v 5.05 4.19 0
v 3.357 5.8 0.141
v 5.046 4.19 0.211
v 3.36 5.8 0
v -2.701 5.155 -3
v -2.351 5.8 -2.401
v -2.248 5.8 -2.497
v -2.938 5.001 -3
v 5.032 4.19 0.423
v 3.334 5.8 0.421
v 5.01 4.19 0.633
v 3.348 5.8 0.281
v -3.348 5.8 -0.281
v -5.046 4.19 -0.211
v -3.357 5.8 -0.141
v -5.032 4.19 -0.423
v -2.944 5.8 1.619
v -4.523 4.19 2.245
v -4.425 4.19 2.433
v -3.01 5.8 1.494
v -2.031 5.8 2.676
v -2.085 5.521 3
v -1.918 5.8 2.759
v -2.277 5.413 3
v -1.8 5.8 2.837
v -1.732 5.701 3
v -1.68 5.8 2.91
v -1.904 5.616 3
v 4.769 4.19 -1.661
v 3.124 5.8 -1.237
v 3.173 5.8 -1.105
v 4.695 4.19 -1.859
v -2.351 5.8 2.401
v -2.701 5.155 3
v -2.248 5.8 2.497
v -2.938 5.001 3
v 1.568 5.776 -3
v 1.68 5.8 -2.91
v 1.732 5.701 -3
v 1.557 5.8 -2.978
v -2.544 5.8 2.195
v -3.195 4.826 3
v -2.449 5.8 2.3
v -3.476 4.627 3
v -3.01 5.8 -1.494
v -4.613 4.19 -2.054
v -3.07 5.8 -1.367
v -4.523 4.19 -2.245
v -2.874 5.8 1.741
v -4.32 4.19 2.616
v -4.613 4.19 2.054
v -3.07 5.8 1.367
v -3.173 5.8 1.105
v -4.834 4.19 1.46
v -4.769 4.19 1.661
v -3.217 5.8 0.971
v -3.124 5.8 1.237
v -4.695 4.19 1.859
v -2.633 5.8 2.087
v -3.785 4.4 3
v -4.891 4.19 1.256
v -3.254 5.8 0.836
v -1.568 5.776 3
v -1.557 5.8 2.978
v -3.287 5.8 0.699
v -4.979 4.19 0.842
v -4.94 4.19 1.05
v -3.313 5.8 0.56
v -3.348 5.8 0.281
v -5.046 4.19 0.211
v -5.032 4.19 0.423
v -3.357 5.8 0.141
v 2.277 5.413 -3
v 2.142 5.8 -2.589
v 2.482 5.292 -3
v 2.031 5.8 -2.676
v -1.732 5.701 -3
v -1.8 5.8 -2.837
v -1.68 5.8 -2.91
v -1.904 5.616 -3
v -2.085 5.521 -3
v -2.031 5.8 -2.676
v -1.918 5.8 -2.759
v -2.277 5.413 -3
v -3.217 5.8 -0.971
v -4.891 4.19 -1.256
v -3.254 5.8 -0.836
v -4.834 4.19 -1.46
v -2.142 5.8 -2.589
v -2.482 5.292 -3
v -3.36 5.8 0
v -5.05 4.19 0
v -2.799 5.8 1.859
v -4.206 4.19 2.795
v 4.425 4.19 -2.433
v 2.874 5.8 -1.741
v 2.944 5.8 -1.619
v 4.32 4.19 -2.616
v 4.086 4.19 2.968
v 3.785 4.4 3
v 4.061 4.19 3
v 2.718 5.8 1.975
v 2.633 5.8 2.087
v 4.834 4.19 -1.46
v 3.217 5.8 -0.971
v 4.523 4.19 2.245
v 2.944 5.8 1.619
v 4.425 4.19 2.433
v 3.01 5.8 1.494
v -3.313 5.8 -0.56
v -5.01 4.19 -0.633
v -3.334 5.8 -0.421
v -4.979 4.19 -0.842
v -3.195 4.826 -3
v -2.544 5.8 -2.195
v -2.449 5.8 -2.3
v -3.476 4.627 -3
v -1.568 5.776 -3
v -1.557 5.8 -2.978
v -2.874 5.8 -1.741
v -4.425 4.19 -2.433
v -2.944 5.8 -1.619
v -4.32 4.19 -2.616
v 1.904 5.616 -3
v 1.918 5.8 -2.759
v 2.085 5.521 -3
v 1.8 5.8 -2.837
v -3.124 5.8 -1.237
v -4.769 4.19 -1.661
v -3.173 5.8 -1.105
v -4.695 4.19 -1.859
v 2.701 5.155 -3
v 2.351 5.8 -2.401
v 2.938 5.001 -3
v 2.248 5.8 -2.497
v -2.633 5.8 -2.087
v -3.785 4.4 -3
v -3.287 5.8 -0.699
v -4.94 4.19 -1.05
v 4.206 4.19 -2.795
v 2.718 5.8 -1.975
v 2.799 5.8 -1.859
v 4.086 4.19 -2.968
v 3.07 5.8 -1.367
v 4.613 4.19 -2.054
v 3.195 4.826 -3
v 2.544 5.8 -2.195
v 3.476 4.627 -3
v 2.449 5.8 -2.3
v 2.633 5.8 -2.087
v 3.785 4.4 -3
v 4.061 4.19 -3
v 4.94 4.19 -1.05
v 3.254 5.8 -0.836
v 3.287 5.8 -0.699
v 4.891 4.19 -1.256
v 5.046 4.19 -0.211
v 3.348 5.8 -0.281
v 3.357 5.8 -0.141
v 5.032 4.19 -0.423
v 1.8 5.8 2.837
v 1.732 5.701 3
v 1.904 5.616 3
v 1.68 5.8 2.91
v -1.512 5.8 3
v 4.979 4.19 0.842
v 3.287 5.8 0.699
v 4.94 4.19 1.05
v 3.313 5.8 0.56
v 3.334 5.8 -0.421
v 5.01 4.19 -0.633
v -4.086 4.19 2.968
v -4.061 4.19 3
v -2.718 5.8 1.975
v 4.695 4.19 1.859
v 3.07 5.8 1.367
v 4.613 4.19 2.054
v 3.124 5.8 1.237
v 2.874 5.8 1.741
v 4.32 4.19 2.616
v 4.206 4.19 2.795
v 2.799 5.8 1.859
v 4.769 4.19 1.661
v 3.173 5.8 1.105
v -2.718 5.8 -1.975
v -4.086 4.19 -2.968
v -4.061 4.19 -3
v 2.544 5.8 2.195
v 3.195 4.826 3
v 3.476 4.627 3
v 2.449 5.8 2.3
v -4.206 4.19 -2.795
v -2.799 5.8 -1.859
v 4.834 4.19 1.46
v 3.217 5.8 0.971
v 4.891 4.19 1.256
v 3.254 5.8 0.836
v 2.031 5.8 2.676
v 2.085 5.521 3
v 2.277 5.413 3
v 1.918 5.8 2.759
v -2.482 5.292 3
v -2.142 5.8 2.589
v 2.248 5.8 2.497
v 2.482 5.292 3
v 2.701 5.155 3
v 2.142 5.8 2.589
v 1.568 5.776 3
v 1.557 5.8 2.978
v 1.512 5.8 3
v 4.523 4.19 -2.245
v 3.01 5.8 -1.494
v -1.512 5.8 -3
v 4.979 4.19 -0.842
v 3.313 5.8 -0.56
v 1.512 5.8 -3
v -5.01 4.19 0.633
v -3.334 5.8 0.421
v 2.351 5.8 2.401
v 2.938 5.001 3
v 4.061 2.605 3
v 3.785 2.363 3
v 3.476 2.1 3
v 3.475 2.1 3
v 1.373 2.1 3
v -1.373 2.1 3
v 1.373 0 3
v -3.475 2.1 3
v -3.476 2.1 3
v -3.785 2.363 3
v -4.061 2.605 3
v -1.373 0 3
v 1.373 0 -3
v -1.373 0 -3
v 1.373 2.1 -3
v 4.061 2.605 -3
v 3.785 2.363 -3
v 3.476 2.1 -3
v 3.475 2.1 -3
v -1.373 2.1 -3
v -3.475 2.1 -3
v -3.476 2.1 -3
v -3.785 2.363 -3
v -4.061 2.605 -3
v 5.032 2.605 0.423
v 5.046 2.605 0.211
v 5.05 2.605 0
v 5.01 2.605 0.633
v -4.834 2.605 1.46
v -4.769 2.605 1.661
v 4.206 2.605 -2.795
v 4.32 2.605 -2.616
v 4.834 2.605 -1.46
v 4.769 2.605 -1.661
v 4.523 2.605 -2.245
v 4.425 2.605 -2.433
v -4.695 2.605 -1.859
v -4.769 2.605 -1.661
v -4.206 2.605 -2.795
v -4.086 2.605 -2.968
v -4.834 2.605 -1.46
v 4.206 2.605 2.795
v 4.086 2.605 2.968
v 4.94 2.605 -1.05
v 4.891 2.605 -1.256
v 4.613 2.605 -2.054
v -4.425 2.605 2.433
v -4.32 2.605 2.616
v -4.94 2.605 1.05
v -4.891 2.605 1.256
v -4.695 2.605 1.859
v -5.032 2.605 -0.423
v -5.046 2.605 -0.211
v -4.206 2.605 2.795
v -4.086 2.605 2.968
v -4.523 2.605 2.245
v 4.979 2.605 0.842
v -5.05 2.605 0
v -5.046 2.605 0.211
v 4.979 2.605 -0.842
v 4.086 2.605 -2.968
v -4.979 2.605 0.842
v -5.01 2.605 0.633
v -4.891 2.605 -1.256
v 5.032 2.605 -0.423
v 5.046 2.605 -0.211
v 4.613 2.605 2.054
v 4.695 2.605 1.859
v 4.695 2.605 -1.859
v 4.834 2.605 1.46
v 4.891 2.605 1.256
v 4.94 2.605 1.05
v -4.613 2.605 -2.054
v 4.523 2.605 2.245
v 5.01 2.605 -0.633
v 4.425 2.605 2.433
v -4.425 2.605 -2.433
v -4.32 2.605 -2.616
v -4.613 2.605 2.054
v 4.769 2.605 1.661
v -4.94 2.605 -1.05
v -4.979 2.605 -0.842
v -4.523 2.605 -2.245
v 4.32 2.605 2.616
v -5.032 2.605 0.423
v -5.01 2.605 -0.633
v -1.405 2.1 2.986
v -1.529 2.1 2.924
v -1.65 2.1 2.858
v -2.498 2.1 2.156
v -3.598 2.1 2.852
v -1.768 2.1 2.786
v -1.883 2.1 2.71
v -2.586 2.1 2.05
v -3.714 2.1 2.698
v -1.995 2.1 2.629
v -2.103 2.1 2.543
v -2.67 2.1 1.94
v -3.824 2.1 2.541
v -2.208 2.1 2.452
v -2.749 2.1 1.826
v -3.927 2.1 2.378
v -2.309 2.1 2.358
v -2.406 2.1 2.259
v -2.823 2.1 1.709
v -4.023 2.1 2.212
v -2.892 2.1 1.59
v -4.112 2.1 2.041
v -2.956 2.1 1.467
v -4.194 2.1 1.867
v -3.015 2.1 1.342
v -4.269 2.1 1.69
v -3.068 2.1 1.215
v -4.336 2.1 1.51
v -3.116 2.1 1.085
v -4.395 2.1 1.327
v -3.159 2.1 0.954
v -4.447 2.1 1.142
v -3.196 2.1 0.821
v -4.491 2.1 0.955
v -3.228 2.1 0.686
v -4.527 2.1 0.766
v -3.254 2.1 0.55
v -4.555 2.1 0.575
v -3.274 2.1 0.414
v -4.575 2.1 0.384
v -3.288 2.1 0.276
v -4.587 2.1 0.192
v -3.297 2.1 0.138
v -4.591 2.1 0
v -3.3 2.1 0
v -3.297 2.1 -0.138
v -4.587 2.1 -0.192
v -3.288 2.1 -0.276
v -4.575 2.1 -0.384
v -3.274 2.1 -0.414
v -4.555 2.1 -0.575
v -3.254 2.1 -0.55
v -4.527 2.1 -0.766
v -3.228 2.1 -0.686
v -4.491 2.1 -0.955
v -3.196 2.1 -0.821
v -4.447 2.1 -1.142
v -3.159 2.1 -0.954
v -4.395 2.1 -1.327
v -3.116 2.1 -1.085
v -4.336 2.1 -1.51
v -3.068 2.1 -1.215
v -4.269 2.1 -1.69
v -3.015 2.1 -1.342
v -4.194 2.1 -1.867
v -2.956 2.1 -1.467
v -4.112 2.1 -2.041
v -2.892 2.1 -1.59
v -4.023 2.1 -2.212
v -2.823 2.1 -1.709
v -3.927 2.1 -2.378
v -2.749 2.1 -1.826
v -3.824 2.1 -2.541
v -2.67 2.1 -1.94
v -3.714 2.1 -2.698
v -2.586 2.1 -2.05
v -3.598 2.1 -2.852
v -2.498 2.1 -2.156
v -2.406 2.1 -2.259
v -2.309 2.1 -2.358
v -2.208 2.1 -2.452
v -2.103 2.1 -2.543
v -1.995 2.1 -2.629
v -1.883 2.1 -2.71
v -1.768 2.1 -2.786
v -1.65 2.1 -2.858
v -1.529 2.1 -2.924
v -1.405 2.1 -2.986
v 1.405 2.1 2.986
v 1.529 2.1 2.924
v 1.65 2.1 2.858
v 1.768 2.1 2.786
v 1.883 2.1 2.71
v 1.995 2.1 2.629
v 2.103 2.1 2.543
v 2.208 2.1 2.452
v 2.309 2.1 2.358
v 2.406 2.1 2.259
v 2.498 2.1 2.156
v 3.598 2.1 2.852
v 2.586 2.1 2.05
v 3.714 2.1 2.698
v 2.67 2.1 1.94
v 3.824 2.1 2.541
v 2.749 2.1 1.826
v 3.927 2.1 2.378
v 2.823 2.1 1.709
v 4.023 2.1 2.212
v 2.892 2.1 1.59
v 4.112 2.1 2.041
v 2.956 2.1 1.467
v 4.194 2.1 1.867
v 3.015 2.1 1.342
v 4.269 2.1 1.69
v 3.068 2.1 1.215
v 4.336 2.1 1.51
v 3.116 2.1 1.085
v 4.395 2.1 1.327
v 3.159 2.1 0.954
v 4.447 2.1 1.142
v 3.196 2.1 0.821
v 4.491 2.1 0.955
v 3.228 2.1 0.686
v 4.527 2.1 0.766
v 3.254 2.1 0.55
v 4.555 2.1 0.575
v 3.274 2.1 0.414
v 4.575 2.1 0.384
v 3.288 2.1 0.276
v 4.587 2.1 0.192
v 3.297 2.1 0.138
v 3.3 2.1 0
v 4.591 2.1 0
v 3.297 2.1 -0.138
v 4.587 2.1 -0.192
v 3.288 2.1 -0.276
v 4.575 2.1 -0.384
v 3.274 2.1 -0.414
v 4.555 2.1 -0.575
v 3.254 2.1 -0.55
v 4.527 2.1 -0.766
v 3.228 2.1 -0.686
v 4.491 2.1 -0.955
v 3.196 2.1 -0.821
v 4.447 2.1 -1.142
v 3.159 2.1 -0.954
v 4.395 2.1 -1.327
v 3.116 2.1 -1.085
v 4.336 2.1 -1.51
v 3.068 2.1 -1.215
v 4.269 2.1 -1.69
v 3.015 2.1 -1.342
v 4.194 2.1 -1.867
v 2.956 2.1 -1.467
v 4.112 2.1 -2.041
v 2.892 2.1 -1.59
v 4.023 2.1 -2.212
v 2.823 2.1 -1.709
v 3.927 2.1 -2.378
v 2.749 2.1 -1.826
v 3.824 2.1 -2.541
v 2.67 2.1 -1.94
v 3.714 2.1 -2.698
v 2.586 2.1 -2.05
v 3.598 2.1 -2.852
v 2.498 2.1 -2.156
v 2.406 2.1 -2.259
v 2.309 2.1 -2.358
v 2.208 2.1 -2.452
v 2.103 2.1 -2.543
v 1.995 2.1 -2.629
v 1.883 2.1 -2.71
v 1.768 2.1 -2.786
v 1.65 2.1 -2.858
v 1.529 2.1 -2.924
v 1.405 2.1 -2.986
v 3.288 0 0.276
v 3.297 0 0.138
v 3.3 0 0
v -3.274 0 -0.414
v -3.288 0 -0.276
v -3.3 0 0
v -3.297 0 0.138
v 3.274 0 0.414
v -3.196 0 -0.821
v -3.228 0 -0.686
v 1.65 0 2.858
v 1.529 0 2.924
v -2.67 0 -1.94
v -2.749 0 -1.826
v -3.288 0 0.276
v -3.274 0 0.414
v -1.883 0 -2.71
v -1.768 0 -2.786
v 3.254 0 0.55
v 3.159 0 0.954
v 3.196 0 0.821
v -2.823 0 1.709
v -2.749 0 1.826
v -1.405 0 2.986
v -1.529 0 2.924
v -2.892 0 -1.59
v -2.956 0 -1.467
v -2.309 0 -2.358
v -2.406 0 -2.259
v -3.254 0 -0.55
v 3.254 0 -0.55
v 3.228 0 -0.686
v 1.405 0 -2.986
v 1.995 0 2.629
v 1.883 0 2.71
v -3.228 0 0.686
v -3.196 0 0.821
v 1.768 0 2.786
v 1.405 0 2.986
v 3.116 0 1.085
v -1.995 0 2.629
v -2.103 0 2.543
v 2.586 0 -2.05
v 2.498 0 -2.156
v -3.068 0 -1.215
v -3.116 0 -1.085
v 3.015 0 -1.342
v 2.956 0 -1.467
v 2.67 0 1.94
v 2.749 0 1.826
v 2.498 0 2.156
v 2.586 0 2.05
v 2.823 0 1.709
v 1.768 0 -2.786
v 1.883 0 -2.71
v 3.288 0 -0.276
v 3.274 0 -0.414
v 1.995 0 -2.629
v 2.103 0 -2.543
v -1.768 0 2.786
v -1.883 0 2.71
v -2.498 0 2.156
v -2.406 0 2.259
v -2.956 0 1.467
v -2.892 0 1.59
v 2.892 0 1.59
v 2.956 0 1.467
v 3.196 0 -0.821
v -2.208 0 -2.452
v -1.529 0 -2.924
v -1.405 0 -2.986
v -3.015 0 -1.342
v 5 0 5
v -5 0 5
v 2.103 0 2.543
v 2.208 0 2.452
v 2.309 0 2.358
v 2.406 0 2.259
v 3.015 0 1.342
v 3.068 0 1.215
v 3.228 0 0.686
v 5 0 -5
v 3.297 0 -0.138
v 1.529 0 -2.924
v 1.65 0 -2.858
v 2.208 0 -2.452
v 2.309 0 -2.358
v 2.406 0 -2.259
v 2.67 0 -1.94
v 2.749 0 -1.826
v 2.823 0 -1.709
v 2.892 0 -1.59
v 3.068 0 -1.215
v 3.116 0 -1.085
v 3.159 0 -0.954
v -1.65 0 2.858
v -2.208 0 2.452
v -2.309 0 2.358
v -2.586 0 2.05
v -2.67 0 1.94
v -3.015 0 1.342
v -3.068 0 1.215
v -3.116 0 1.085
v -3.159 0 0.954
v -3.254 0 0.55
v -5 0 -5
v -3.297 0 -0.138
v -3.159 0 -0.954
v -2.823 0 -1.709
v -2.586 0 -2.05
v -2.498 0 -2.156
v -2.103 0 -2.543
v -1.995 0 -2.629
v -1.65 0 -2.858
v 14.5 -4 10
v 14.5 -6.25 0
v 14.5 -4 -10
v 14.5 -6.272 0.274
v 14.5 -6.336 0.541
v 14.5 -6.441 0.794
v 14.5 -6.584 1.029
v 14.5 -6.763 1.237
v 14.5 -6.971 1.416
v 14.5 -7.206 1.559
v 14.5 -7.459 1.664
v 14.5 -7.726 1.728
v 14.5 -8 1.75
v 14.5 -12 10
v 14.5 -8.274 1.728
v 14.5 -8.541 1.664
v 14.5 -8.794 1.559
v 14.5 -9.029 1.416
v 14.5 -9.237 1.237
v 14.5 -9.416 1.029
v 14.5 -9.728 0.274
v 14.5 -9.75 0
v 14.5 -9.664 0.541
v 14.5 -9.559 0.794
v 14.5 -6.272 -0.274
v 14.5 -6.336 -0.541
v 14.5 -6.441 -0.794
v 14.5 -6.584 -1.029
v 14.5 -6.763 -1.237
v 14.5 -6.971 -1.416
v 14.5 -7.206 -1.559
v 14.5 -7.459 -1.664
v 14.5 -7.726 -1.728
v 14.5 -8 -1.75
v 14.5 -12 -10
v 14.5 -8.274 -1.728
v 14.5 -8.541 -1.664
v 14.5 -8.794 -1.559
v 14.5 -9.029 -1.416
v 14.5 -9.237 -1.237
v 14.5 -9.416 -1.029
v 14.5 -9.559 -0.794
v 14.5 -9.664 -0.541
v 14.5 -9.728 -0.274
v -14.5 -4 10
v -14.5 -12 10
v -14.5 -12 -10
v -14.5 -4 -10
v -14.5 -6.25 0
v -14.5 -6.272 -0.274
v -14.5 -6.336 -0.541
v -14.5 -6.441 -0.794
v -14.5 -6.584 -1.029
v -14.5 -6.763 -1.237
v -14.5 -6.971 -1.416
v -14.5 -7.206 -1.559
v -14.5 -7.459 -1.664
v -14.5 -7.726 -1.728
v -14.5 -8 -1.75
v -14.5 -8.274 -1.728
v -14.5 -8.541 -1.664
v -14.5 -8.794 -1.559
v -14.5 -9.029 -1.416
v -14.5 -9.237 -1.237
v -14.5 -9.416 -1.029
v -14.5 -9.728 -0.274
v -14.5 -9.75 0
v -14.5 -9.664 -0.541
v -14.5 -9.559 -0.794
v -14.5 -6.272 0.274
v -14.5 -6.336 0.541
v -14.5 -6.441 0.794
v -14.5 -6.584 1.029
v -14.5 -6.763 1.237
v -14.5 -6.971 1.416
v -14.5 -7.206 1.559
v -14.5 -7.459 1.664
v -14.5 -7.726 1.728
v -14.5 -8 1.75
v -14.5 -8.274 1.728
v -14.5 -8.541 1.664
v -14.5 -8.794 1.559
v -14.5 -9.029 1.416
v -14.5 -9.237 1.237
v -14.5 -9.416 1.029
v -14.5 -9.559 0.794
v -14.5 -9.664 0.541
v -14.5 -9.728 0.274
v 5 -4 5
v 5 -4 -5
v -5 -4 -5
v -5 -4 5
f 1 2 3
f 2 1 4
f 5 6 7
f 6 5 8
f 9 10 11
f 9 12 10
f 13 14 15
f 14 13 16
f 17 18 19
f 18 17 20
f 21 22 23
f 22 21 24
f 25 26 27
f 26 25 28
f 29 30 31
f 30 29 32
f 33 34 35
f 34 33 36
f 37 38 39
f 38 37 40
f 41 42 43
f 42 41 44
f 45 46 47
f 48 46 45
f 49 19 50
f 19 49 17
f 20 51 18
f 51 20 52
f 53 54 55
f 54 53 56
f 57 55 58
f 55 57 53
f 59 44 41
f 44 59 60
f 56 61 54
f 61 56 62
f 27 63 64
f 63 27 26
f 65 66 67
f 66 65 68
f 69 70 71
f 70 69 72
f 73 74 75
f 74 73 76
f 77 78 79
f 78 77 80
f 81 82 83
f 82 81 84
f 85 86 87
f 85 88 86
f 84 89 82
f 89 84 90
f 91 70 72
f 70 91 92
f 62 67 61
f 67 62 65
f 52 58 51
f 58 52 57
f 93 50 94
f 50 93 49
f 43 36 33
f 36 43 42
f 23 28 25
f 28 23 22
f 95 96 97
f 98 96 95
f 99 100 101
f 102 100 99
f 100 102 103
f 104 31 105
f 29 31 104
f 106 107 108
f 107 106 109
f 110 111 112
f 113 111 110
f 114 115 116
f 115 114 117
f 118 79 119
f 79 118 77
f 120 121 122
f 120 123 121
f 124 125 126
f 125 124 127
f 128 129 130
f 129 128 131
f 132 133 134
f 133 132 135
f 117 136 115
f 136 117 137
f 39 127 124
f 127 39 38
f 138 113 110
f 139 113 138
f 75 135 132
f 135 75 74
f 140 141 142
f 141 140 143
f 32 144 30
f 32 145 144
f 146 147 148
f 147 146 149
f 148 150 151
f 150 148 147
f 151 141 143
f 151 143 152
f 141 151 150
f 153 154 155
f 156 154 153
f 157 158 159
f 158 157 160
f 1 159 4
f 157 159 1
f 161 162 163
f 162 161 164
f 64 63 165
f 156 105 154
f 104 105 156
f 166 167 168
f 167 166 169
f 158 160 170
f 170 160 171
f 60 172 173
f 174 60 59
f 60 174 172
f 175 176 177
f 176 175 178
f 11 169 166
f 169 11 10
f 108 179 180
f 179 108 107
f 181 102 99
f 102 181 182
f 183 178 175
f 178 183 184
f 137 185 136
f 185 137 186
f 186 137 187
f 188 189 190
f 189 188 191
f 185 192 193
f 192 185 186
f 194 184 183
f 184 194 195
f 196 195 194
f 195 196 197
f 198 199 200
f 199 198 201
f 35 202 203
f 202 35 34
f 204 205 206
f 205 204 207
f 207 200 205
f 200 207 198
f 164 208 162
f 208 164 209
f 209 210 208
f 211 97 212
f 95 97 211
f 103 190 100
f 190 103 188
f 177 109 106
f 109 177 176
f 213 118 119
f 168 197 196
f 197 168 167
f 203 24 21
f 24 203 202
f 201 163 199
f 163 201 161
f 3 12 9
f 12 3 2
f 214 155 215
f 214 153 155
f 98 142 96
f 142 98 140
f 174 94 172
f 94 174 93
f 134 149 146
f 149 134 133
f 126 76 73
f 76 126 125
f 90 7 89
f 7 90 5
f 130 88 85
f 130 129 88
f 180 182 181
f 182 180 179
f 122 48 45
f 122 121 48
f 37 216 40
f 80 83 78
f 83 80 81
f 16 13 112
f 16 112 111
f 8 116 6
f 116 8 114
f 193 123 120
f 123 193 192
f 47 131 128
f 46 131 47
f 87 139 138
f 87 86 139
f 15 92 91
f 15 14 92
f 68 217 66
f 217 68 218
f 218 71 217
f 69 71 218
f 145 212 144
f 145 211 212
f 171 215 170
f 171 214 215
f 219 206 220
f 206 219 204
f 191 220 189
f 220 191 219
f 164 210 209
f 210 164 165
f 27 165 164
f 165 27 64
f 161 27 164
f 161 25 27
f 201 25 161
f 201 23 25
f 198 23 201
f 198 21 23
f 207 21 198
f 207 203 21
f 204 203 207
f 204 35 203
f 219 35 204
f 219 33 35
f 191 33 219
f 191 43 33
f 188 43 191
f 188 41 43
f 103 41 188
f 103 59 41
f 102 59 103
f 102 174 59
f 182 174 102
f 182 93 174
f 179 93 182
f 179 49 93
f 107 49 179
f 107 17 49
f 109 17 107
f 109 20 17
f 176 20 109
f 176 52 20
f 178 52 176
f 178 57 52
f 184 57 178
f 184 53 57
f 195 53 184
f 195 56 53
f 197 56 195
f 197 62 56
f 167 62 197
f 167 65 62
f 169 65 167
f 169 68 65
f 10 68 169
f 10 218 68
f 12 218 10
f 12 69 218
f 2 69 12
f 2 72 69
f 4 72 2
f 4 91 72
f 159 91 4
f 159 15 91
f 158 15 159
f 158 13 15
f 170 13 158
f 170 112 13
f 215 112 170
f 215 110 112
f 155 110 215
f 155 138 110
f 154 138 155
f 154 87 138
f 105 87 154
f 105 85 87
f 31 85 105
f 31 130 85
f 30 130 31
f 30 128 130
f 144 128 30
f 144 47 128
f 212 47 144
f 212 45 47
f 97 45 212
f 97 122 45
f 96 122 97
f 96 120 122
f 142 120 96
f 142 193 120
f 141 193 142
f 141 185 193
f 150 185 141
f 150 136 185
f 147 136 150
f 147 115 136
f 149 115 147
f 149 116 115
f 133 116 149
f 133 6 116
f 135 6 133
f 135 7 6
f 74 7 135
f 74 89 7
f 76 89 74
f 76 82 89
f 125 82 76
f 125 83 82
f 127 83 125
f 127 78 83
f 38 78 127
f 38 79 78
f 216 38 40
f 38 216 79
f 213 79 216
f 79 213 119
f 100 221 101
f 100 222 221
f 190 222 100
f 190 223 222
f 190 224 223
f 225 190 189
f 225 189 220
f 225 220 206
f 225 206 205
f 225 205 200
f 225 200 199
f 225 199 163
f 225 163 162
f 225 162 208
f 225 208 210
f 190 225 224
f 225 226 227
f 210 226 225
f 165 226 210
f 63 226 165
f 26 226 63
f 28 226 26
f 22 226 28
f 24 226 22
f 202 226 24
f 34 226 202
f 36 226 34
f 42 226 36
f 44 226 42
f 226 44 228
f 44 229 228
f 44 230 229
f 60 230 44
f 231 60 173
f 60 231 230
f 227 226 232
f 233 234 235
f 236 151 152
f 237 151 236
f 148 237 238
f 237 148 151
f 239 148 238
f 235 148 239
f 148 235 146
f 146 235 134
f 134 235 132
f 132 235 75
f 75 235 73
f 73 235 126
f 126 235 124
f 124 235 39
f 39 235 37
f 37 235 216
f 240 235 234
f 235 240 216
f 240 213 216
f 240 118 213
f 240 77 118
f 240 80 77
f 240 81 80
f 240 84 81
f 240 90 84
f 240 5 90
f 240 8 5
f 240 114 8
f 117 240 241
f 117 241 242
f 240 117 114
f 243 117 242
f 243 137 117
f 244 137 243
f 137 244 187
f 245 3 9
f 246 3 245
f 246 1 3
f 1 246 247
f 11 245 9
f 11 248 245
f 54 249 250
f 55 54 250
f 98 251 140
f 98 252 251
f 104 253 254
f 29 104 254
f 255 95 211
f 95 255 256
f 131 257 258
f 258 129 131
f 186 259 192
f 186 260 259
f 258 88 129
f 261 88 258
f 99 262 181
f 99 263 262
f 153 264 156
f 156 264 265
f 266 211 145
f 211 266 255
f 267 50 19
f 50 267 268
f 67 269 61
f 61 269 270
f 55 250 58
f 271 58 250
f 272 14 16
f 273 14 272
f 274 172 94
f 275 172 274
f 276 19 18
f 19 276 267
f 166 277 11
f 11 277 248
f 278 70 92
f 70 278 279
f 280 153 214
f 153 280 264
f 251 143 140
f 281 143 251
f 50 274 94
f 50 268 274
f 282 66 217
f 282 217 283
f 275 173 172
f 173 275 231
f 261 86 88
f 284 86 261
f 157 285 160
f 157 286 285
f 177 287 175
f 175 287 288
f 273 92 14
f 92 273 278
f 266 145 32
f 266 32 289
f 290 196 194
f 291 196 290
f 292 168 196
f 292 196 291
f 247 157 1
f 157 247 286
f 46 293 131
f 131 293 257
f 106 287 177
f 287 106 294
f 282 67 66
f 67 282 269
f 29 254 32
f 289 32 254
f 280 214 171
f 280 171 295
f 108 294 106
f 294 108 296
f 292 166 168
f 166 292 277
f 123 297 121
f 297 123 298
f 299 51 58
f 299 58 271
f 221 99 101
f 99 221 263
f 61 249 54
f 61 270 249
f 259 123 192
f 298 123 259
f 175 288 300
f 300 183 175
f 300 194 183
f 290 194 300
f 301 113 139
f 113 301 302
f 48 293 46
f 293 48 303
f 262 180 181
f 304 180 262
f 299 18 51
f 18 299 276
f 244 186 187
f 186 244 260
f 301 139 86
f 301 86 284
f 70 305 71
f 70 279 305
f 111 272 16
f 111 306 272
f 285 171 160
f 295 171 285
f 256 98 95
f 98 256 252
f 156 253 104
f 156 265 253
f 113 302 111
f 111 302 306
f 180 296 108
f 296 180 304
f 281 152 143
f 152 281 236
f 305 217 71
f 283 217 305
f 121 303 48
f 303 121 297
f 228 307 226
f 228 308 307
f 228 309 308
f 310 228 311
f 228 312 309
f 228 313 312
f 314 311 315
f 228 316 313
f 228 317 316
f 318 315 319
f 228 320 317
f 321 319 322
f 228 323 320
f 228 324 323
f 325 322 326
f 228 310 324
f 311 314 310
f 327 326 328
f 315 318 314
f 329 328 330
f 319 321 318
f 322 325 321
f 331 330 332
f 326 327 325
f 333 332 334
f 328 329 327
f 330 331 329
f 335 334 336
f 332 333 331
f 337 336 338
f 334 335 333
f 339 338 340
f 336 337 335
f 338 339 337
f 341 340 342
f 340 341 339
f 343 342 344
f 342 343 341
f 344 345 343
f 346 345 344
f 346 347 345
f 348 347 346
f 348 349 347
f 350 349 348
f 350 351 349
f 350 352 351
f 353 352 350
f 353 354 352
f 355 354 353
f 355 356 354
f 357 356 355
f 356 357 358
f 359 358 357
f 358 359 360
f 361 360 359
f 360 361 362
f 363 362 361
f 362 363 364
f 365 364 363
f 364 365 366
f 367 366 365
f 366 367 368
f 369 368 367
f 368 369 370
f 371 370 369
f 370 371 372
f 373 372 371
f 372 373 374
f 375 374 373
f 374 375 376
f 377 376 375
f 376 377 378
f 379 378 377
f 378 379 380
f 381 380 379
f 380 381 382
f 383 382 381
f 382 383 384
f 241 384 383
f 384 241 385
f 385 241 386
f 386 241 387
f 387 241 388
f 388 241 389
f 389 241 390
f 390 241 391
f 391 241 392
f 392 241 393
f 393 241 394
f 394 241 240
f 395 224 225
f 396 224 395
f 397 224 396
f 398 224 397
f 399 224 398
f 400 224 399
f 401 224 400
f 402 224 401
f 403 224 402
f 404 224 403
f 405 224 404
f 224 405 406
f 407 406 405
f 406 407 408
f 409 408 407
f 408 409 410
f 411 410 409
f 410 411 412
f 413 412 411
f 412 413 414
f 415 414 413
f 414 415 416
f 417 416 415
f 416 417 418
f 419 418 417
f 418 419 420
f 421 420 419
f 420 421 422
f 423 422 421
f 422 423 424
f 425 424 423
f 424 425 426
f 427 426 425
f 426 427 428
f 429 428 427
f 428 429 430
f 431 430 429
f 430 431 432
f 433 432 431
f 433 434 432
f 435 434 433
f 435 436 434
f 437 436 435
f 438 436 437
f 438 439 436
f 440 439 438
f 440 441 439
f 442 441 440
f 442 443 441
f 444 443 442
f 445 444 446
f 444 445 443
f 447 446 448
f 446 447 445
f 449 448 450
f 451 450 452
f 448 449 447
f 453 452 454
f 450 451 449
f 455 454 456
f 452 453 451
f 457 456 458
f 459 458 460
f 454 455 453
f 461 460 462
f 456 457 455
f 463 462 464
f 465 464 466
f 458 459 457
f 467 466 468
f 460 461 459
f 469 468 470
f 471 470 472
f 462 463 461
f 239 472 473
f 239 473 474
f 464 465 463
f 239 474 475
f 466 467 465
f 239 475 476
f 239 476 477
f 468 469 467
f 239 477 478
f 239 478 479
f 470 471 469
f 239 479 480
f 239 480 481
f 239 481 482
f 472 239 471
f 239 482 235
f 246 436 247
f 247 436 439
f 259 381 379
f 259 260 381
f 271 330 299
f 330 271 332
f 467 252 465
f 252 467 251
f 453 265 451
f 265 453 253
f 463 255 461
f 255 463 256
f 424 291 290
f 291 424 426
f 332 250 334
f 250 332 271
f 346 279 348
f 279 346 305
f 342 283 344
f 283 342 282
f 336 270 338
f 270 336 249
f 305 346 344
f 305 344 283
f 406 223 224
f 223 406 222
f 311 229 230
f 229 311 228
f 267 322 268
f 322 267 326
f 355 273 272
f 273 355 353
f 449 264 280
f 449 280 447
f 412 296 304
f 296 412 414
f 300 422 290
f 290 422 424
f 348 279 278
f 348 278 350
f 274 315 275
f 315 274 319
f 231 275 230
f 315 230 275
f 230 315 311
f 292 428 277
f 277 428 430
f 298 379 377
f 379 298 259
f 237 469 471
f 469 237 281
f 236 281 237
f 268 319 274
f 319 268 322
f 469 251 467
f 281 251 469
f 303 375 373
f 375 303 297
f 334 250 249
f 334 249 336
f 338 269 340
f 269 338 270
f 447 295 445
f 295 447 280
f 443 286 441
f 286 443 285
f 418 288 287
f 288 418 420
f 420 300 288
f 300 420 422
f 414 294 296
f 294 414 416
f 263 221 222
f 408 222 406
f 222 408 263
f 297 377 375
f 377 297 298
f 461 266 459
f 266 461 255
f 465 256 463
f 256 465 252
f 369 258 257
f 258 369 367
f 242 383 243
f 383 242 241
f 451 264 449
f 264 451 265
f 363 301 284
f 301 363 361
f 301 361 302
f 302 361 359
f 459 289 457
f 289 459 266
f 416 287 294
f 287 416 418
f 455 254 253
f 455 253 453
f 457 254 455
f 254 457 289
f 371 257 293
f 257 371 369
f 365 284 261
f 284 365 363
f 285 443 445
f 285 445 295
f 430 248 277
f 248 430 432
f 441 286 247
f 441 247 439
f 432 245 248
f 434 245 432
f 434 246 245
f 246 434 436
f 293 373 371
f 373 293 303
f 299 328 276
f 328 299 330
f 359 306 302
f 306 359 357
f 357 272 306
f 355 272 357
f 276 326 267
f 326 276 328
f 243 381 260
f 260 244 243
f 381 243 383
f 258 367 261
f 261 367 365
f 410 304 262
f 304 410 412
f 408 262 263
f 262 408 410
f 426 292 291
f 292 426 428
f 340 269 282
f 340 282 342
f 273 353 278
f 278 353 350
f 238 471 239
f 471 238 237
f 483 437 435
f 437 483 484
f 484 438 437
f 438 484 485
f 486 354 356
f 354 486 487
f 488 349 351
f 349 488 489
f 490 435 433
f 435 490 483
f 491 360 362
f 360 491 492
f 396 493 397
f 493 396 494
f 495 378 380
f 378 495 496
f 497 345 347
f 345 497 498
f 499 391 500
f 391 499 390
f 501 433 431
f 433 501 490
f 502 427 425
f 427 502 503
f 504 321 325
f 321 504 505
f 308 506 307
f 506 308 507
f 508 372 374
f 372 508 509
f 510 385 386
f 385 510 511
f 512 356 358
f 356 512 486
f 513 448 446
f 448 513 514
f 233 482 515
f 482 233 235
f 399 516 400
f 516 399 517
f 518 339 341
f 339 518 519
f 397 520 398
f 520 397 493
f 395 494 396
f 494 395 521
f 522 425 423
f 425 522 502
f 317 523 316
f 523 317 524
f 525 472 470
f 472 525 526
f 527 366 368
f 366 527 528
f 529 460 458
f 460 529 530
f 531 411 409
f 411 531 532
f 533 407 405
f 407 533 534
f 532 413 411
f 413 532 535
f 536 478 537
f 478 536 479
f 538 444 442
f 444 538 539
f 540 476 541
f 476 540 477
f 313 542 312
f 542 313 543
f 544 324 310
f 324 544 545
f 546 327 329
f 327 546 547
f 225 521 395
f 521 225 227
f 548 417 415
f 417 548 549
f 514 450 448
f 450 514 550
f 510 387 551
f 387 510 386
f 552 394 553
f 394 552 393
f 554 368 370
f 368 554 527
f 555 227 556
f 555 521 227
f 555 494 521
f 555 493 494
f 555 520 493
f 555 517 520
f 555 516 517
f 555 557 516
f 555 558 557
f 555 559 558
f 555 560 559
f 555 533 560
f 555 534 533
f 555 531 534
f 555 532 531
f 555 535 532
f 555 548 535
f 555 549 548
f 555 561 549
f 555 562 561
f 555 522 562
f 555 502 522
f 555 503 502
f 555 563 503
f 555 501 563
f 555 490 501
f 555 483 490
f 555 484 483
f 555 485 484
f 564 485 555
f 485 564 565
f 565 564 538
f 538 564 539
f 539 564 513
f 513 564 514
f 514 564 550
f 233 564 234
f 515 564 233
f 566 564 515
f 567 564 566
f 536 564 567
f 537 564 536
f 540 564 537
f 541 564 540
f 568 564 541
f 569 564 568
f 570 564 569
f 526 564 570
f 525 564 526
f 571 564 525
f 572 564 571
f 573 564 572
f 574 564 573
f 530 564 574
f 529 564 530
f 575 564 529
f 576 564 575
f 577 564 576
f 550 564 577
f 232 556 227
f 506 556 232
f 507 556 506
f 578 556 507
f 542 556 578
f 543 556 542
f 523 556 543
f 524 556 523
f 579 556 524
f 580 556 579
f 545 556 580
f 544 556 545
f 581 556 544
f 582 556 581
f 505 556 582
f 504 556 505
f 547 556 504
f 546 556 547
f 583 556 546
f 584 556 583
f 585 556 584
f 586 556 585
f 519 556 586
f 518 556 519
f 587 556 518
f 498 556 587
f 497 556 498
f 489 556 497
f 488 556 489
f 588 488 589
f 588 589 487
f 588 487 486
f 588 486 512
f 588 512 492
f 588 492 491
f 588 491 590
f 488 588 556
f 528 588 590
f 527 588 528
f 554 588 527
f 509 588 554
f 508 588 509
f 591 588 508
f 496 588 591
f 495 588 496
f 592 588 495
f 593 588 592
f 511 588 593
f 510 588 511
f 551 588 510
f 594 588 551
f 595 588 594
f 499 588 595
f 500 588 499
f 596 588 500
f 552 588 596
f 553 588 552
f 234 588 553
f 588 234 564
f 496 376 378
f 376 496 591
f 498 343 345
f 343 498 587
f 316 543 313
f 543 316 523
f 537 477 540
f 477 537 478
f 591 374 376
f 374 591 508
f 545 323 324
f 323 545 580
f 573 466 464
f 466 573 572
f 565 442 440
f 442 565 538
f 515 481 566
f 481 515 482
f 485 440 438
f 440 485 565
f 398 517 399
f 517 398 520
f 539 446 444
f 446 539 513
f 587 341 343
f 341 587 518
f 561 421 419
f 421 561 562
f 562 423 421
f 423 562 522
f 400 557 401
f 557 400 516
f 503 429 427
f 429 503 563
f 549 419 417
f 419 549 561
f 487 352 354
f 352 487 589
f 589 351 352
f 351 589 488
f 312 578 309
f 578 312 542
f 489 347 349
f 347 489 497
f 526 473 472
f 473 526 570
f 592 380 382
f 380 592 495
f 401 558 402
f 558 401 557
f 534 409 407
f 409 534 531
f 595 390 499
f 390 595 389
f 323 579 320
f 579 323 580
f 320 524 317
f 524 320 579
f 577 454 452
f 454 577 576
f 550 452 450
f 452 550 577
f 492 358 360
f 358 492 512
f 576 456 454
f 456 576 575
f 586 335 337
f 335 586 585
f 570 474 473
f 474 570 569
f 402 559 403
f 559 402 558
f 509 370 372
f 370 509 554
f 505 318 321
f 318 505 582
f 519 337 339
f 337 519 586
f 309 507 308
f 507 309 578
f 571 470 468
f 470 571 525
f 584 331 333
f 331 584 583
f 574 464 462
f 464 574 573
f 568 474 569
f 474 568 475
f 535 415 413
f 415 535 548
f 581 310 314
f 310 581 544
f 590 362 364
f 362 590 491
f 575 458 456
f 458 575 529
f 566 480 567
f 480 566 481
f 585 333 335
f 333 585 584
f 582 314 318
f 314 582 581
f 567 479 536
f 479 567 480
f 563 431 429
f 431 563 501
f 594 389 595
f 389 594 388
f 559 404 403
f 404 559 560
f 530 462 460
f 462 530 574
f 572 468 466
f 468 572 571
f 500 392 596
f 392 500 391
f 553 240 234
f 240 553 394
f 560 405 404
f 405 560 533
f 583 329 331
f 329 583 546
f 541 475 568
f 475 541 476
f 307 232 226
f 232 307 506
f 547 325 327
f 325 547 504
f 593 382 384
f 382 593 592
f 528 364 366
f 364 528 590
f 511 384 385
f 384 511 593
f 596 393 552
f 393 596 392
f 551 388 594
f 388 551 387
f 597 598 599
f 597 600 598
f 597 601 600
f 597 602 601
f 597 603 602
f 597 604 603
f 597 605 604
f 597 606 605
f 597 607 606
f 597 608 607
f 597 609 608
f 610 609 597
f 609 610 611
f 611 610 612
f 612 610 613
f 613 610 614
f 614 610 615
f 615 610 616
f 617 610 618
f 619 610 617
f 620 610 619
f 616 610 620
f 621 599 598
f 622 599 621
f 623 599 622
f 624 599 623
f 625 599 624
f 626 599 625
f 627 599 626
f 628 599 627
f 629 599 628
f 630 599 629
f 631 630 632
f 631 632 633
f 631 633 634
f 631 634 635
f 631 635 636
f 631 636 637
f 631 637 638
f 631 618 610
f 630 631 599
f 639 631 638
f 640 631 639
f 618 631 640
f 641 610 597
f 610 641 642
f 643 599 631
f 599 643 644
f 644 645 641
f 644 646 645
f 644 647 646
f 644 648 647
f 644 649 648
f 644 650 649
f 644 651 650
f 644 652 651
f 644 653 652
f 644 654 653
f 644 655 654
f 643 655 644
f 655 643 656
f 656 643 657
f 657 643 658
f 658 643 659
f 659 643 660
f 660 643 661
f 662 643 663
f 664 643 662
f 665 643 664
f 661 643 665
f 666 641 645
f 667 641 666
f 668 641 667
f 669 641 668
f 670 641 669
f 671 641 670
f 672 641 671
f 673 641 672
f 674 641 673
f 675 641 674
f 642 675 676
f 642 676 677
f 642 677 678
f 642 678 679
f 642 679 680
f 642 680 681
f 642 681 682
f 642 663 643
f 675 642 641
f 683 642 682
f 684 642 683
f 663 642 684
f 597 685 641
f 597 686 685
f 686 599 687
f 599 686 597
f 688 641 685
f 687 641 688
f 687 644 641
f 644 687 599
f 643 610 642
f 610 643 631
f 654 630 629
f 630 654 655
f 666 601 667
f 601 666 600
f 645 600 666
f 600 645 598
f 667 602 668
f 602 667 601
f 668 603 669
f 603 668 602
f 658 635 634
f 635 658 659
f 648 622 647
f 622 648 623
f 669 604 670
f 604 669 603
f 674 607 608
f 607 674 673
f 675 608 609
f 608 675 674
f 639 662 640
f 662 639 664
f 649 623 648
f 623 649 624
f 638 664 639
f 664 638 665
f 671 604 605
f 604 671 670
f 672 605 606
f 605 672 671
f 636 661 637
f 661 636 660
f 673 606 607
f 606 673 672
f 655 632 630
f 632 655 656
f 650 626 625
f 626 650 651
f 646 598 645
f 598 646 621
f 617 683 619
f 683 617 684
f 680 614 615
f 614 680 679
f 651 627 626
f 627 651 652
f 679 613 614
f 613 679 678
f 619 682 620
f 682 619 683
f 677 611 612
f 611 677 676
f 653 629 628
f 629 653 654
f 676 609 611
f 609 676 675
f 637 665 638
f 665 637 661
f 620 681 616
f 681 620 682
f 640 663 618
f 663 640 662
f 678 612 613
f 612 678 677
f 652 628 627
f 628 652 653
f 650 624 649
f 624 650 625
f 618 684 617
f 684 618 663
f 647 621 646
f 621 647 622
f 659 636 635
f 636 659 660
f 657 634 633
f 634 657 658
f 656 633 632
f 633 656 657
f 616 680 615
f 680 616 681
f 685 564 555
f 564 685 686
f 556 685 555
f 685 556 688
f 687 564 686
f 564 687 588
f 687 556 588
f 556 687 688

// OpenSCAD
mount_width = 29;

/*
intersection()
{
  translate([-105, -142, -28])
  import("CableClip2.stl", 5);

  translate([0, 25, -8])
  cube([50, 50, 50], center = true);
}
*/

module extrusion_attachment()
{
  union()
  {
    intersection()
    {
      difference()
      {
        difference()
        {
          translate([0, 9, 0])
          rotate([90, 0, 0])
          cylinder(20, 0, 21, $fn = 150);
          
          translate([0, 30.8, 0])
          cube([50, 50, 50], center = true);
        }
        
        translate([0, 0, 28])
        cube([50, 50, 50], center = true);
        translate([0, 0, -28])
        cube([50, 50, 50], center = true);
      }

      translate([0, 8, 0])
      rotate([90, 0, 0])
      cylinder(20, 5.05, 5.05, $fn = 150);

      translate([0, 22.1, 0])
      rotate([90, 0, 0])
      cylinder(20, 5.05, 5.05, $fn = 150);
      
      translate([0, 8.05, 0])
      rotate([90, 0, 0])
      cylinder(11, 10, 0, $fn = 150);
    }

    difference()
    {
      translate([0, 5, 0])
      rotate([90, 0, 0])
      cylinder(5, 3.3, 3.3, $fn = 150);
      
      translate([0, 0, 28])
      cube([50, 50, 50], center = true);
      translate([0, 0, -28])
      cube([50, 50, 50], center = true);
    }
  }
}

module top_screw(expand = 0)
{
  translate([0, -4, 0])
  rotate([90, 0, 90])
  cylinder(60, d = 3 + expand, center = true, $fn = 40);
}

module bottom_screw()
{
  translate([0, -8 - 7.5, 0])
  rotate([90, 0, 90])
  cylinder(60, d = 4, center = true, $fn = 40);
}

module attachment_block()
{
  translate([0, -2, 0])
  cube([10, 4, 10], center = true);

  translate([0, -4, 0])
  difference()
  {
    translate([0, -4, 0])
    cube([mount_width, 8, 20], center = true);

    top_screw(expand = 0.5);
  }
}

extrusion_attachment();
attachment_block();

/*
difference()
{
  translate([mount_width / 2+ 2.5, -12, 0])
  cube([12, 24, 20], center = true);
  
  top_screw(expand = 1);
  bottom_screw();
}

difference()
{
  translate([-mount_width / 2 + -2.5, -12, 0])
  cube([12, 24, 20], center = true);
  
  top_screw(expand = 1);
  bottom_screw();
}
*/
